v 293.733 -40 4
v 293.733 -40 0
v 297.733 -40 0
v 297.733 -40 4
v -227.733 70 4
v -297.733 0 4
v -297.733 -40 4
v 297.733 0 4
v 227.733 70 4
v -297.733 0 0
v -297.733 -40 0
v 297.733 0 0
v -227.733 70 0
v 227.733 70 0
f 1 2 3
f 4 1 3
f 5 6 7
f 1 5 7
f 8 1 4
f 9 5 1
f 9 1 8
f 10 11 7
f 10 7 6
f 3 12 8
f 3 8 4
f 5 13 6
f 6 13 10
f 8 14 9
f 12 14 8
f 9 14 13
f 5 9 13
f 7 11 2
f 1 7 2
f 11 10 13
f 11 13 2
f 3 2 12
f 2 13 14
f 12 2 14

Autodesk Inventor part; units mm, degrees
ref_plane "YZ Plane" through (0, 0, 0) normal (1, 0, 0) x (0, 1, 0)
ref_plane "XZ Plane" through (0, 0, 0) normal (0, 1, 0) x (-1, 0, 0)
ref_plane "XY Plane" through (0, 0, 0) normal (0, 0, 1) x (1, 0, 0)
sketch "スケッチ1" plane through (0, 0, 0) normal (0, 0, 1) x (1, 0, 0)
  line L0 (-297.7333, 0) -> (297.7333, 0) construction
  line L1 (297.7333, 0) -> (297.7333, 0)
  line L2 (227.7333, 70) -> (-227.7333, 70)
  line L3 (-297.7333, 0) -> (-297.7333, 0)
  line L4 (0, 0) -> (0, 70) construction
  line L5 (-227.7333, 70) -> (-297.7333, 0)
  line L6 (227.7333, 70) -> (297.7333, 0)
  line L7 (-297.7333, 0) -> (297.7333, 0) construction
  line L8 (297.7333, 0) -> (297.7333, -40)
  line L9 (293.7333, -67.2) -> (-297.7333, -67.2) construction
  line L10 (-297.7333, -67.2) -> (-297.7333, -40) construction
  line L11 (-297.7333, -40) -> (297.7333, -40)
  line L12 (297.7333, -40) -> (293.7333, -40)
  line L13 (293.7333, -40) -> (293.7333, -67.2)
  line L14 (-297.7333, -40) -> (-297.7333, 0)
  point P0 (297.7333, 70)
  point P1 (-297.7333, 70)
  point P2 (0, 0)
  dimension "d0" = 70
  dimension "d1" = 595.4667
  dimension "d3" = 70
  dimension "d4" = 70
  dimension "d5" = 70
  dimension "d6" = 70
  dimension "d7" = 67.2
  dimension "d10" = 40
  dimension "d12" = 4
extrude "押し出し1" add sketch "スケッチ1" along normal blind 4
equation "\"d4\" = d3"
equation "\"d5\" = d3"
equation "\"d6\" = d5"
properties part number "泥除け2"
